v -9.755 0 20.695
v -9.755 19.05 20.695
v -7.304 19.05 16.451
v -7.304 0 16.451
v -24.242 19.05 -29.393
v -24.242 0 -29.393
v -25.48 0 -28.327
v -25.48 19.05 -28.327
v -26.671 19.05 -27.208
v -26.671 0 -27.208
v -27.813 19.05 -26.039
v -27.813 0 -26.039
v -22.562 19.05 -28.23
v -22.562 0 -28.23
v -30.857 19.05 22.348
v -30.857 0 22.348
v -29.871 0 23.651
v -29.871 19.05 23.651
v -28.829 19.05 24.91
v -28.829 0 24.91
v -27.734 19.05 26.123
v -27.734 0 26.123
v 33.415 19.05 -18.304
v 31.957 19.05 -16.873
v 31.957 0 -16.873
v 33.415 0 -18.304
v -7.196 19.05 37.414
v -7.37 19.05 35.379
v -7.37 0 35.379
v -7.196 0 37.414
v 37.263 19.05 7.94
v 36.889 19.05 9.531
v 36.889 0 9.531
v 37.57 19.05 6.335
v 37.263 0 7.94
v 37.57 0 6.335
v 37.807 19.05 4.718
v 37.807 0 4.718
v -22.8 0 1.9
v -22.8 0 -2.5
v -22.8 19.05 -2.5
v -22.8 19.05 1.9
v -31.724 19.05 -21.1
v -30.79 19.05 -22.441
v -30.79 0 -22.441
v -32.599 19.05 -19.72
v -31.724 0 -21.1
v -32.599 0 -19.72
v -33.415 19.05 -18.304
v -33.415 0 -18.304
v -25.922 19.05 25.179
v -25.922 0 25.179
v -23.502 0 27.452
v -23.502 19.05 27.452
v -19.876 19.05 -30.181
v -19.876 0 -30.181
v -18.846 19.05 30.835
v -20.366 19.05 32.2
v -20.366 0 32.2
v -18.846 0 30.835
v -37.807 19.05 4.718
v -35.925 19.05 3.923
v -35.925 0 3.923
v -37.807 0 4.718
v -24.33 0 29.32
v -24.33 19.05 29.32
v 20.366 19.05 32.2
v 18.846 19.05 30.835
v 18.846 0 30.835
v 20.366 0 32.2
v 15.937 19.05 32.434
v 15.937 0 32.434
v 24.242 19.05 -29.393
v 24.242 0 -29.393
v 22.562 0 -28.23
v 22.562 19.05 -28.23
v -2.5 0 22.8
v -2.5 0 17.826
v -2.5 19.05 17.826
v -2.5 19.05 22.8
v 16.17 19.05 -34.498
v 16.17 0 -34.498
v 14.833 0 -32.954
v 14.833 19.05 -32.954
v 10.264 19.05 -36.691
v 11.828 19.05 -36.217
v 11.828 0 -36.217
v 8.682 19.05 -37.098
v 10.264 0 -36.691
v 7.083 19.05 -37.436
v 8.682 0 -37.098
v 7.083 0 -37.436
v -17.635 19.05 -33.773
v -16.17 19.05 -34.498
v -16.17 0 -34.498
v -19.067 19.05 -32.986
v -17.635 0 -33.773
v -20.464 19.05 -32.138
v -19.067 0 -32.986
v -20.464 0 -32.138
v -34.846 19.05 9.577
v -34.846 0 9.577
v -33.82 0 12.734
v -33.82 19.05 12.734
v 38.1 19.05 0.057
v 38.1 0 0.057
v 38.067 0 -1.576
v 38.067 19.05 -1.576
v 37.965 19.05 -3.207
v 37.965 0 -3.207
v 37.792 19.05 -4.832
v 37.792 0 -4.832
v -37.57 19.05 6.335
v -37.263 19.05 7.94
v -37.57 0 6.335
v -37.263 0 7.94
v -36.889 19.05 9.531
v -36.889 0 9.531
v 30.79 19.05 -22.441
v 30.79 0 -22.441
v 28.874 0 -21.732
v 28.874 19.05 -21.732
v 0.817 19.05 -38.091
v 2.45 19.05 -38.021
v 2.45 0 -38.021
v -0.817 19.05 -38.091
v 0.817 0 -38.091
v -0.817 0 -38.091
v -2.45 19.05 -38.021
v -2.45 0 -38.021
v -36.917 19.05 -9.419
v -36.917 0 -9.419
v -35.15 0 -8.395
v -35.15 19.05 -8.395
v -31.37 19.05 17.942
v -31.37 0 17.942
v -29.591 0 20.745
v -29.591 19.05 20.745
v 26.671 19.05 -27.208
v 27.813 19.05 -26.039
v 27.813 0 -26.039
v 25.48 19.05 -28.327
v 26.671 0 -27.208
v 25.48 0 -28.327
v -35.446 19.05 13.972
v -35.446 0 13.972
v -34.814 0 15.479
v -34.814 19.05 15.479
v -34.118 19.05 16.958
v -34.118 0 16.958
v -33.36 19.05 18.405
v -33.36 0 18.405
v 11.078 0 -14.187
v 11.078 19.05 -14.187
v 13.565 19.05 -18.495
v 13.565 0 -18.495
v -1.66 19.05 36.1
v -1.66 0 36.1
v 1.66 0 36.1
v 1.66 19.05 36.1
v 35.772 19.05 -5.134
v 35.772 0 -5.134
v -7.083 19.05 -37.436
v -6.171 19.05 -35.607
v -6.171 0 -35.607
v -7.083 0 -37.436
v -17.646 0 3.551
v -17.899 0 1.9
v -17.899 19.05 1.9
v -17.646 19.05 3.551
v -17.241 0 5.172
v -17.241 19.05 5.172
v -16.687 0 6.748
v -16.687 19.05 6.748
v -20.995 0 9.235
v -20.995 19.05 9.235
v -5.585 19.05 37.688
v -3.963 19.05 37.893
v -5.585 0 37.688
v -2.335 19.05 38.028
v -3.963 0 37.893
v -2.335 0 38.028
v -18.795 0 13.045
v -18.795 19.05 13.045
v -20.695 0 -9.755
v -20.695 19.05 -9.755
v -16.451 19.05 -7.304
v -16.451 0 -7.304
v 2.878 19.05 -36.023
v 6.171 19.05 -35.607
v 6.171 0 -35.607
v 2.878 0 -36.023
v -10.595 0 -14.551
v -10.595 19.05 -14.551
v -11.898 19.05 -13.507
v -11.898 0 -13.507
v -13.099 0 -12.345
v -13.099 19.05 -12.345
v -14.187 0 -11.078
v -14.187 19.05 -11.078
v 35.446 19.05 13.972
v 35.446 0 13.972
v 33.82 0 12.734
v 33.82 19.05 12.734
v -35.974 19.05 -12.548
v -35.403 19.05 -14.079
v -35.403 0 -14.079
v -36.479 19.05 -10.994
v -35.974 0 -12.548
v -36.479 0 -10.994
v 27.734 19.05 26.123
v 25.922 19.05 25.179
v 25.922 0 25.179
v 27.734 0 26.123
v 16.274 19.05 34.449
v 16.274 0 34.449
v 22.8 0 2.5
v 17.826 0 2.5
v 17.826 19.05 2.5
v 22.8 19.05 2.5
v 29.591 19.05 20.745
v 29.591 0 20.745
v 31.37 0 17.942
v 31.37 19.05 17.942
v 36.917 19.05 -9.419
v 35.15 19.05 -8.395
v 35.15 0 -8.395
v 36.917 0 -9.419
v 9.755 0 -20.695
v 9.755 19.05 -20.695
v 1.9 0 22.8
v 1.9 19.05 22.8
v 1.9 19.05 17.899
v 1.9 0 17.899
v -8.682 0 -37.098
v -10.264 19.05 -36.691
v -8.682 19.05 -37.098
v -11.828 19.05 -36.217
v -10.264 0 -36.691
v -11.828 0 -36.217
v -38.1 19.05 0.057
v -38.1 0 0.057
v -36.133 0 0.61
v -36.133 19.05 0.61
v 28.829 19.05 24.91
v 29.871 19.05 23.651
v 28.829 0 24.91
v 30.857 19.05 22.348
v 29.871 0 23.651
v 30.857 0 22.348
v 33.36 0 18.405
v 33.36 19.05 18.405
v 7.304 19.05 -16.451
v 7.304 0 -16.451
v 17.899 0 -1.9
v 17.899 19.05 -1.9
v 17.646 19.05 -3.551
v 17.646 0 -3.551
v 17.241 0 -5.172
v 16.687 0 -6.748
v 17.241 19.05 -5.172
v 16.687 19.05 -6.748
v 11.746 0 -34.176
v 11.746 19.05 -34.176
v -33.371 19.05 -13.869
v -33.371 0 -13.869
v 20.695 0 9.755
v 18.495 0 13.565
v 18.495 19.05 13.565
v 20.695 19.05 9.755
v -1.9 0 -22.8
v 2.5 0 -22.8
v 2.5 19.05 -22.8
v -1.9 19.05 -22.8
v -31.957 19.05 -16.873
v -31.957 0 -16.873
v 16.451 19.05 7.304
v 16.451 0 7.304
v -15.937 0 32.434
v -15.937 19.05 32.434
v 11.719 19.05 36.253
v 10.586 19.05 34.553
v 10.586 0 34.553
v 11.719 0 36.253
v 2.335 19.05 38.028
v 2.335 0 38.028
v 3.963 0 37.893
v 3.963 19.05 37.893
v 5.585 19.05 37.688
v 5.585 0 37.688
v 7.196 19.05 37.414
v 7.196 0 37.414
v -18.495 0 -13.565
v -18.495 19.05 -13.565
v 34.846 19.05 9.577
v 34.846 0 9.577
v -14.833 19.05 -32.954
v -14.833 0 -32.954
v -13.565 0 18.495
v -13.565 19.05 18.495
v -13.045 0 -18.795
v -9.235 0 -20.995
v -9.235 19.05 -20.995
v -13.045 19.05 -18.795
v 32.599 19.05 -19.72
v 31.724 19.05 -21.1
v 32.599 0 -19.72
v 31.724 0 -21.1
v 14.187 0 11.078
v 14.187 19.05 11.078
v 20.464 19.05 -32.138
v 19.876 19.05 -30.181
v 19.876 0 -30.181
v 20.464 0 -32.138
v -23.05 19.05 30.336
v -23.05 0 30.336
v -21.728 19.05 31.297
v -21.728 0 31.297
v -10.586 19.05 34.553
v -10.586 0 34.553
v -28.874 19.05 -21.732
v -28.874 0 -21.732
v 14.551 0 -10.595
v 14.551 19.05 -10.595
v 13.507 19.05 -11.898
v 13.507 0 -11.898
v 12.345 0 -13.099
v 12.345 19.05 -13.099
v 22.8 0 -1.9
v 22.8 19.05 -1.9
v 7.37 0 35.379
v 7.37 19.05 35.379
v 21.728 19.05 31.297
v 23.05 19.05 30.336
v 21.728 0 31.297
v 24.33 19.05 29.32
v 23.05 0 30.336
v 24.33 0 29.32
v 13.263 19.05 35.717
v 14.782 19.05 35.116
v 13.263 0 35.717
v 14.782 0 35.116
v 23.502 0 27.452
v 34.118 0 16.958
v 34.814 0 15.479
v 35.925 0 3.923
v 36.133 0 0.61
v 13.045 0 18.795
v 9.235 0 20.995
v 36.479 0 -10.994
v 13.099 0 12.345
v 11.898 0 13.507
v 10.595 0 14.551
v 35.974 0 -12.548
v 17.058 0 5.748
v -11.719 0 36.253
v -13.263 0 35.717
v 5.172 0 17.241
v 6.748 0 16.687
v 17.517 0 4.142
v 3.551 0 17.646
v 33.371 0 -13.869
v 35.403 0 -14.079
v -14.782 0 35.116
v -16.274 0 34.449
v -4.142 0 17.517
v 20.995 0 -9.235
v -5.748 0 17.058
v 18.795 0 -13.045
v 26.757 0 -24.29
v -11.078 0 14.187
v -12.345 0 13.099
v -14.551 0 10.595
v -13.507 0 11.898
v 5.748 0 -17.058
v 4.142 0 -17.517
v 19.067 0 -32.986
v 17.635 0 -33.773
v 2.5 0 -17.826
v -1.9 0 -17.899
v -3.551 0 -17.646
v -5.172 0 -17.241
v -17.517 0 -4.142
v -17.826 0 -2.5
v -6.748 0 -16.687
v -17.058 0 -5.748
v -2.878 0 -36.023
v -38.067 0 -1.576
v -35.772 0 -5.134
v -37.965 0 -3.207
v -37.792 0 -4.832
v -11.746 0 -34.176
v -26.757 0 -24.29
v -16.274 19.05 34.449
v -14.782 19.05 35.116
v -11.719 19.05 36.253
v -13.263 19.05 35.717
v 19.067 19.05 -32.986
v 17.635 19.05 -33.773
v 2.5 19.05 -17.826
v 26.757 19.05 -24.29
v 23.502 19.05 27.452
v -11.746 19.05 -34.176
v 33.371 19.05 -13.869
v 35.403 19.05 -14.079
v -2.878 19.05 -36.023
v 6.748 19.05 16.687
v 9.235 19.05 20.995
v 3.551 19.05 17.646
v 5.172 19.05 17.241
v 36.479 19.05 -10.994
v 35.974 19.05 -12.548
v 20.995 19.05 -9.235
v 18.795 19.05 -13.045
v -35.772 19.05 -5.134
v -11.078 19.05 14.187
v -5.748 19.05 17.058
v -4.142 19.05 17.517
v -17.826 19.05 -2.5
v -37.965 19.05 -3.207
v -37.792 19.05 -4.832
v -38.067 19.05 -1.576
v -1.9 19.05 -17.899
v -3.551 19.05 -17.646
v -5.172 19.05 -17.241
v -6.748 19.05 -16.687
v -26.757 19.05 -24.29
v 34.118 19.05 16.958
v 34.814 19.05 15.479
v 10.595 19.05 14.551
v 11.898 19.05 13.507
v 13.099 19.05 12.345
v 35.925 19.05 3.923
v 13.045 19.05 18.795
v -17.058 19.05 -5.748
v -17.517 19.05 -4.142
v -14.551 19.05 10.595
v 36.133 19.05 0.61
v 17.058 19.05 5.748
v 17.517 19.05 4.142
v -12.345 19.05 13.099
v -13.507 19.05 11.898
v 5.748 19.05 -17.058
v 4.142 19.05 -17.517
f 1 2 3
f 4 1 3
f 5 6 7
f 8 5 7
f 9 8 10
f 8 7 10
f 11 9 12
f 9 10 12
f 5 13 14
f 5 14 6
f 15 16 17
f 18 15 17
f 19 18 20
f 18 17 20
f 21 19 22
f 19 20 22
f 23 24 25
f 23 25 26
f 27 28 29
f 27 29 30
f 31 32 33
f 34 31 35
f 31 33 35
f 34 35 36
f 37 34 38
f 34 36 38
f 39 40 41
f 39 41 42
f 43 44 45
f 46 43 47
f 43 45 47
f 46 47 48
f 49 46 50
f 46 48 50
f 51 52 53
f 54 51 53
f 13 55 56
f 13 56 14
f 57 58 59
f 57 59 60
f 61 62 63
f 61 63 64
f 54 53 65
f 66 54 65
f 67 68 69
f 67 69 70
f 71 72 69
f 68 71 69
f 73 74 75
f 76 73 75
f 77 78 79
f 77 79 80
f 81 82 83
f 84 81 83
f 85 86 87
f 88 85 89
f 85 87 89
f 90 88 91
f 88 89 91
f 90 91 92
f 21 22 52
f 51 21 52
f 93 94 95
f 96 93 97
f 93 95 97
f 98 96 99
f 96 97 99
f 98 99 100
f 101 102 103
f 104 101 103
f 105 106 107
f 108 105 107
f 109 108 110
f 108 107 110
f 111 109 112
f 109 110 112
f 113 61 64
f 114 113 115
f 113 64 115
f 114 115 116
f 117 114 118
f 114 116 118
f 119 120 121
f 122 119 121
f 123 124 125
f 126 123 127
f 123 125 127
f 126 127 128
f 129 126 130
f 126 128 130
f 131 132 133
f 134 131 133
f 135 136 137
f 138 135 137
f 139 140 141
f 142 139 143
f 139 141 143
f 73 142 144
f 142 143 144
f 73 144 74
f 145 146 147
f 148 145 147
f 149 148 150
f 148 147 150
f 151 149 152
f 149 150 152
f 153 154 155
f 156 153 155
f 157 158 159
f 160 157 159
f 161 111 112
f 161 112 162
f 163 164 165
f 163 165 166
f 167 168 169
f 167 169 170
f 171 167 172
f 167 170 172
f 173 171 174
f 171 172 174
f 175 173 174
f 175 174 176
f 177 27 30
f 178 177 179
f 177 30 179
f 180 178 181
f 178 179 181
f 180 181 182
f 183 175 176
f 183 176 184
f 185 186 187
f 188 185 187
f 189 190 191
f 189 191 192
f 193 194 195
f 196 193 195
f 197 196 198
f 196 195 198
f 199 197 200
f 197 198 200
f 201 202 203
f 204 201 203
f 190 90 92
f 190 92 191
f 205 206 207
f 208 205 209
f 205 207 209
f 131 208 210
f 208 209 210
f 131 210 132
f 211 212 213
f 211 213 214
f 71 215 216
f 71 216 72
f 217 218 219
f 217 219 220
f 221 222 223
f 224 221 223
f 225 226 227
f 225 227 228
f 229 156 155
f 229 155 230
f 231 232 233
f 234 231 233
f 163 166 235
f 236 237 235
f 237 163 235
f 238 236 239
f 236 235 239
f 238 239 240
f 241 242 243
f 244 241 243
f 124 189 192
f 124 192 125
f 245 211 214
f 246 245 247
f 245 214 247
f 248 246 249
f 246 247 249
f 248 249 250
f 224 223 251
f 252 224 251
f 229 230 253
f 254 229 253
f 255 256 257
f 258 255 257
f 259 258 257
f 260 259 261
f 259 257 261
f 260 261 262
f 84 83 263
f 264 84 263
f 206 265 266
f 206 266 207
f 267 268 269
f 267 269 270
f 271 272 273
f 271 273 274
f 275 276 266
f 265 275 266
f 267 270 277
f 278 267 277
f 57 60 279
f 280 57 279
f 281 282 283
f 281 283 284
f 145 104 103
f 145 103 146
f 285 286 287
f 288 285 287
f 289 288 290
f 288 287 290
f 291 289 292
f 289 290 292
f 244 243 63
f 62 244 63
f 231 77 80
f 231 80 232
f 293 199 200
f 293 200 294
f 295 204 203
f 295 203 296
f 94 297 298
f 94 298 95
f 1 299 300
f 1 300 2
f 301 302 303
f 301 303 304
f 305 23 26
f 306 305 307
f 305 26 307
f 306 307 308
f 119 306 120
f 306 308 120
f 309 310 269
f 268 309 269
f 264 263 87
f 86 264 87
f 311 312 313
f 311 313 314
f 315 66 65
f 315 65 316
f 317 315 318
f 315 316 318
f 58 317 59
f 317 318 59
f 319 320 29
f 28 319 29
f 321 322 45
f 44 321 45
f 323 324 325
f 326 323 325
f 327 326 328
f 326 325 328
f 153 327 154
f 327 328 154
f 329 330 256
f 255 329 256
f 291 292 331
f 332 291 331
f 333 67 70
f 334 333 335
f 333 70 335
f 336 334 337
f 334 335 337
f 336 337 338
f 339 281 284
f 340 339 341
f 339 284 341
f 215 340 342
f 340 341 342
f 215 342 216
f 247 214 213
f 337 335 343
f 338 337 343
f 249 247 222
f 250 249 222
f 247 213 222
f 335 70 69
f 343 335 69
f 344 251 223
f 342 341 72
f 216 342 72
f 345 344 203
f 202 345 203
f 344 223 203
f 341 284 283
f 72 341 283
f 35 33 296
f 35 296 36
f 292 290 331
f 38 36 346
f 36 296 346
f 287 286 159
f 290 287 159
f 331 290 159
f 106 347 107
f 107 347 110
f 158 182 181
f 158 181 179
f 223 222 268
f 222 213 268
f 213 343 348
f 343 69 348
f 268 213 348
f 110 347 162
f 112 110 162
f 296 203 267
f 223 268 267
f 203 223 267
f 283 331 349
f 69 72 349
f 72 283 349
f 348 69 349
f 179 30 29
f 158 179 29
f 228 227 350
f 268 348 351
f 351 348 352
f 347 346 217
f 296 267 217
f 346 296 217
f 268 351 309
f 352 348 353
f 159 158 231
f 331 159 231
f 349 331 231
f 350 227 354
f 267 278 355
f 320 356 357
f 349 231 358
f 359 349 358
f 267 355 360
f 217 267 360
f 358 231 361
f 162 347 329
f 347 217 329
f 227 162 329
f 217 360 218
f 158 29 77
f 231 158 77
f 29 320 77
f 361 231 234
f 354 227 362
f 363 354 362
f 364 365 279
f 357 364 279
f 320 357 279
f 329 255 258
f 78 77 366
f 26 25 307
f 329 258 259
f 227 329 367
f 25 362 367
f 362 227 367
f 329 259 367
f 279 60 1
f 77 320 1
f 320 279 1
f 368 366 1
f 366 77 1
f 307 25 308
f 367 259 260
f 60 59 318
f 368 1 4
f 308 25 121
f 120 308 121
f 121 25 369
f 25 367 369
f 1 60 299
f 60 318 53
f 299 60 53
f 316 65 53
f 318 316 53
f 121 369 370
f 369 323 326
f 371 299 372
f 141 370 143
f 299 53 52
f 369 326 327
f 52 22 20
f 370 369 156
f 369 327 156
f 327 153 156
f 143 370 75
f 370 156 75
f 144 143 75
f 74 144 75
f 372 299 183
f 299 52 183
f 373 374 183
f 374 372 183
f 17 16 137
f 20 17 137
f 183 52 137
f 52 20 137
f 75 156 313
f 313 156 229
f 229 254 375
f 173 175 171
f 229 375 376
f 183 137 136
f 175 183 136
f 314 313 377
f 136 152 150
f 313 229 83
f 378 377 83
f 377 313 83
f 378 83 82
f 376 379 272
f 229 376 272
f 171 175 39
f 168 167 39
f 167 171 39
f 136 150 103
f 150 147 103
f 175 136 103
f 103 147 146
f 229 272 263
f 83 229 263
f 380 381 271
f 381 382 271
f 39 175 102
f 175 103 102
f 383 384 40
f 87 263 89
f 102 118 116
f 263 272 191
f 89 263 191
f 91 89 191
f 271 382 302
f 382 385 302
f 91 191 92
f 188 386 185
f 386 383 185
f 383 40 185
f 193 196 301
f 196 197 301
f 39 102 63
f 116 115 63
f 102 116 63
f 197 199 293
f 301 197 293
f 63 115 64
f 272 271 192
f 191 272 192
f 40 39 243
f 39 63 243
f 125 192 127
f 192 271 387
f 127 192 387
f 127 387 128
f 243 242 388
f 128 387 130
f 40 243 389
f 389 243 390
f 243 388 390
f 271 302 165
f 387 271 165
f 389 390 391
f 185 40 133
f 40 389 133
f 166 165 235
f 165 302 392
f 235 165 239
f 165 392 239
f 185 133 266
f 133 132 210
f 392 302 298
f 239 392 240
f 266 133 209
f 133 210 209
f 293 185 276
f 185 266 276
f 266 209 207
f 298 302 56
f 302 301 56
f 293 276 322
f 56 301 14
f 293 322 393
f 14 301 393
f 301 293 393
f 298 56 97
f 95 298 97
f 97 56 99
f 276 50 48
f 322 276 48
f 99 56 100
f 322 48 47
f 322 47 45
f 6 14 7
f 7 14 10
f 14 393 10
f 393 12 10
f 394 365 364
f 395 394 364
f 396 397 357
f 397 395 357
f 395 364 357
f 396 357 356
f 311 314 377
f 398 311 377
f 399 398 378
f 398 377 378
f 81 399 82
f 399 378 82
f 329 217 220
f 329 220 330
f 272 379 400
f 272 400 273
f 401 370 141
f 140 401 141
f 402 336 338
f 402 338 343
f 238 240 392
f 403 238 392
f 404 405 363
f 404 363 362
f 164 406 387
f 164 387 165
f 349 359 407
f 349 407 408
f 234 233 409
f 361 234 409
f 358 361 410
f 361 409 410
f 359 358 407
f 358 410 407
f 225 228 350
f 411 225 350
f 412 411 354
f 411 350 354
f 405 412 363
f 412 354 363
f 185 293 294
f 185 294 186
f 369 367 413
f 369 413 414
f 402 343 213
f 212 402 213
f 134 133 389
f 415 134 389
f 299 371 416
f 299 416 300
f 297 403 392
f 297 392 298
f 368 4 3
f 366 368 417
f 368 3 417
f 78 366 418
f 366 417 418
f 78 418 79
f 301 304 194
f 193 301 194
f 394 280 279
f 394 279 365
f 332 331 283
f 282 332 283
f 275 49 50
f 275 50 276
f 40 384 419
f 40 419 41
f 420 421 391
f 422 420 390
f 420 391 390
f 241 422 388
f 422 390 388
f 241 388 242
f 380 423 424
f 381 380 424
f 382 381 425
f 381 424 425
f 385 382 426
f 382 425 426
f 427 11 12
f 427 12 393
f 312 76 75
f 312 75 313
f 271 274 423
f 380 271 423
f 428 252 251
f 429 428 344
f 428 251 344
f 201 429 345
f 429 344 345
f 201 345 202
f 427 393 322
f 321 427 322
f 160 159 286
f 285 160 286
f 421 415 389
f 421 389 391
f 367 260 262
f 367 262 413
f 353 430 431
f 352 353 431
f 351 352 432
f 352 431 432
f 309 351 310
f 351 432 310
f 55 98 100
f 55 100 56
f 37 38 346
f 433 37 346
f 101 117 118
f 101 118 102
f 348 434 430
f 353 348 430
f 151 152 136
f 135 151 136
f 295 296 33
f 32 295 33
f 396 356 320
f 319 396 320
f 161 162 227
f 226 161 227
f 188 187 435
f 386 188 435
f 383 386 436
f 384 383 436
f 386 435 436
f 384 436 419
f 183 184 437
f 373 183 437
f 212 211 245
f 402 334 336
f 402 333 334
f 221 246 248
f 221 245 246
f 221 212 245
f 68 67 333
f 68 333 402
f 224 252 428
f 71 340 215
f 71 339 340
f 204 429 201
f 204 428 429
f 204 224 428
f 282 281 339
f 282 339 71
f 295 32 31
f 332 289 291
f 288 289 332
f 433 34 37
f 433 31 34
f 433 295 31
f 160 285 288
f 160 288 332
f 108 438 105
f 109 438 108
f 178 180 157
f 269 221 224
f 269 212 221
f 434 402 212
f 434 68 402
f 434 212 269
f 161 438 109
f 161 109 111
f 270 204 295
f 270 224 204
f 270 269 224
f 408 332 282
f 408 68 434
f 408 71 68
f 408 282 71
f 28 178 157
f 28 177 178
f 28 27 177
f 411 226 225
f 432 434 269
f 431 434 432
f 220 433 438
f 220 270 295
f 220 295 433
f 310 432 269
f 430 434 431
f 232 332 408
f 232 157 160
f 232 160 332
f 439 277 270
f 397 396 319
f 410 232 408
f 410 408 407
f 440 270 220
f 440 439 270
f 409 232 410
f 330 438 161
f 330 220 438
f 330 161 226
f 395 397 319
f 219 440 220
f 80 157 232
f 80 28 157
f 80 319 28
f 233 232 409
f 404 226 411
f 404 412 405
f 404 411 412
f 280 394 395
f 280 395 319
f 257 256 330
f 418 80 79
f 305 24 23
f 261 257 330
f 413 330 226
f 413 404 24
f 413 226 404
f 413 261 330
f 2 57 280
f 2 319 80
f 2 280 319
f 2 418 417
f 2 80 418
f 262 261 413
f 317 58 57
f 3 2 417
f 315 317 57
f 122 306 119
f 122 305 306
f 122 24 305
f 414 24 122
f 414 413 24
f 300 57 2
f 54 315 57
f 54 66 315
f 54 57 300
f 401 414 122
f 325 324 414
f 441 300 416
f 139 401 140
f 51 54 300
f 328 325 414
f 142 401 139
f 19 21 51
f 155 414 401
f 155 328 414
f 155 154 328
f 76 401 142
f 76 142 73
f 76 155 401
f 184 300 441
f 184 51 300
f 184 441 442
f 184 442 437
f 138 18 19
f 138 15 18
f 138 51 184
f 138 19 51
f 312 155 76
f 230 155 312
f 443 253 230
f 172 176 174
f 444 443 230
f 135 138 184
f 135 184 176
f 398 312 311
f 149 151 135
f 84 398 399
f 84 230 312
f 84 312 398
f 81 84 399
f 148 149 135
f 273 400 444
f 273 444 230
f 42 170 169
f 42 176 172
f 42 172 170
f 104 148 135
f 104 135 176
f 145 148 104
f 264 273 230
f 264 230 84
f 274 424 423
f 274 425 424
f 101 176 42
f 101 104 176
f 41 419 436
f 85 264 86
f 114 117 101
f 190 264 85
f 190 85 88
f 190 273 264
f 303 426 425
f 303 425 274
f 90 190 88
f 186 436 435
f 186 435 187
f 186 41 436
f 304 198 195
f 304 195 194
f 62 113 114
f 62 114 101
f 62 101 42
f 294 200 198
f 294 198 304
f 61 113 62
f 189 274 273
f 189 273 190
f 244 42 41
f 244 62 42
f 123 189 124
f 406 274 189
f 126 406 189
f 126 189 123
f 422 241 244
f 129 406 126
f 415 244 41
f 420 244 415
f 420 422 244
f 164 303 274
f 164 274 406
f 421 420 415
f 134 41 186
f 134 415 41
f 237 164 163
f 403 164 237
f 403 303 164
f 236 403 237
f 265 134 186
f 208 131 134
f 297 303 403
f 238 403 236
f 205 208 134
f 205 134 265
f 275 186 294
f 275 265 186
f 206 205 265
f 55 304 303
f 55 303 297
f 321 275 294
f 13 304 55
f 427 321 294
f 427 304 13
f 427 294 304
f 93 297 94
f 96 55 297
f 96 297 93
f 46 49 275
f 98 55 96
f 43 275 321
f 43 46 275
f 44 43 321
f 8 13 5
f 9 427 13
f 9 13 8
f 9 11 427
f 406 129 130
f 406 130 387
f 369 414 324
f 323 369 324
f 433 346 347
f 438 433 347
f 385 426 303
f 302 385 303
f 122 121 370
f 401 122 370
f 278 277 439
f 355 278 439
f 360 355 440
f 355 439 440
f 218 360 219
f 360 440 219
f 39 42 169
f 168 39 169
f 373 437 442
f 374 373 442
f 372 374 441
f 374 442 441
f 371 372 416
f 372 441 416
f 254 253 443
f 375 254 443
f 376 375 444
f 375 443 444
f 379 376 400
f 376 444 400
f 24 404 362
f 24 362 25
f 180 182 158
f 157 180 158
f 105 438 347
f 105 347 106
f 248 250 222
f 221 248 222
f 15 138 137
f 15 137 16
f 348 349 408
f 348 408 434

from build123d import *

# Parameters (mm, degrees)
SKETCH1_R           = 38.1
BOSS_EXTRUDE1_DEPTH = 19.05
CUT_EXTRUDE1_DEPTH  = 33
CIRPATTERN1_COUNT   = 25
CUT_EXTRUDE2_DEPTH  = 28
CUT_EXTRUDE8_DEPTH  = 23
CIRPATTERN2_COUNT   = 12


with BuildPart() as part:
    # Sketch1 → Boss-Extrude1 (new body)
    with BuildSketch(Plane(origin=(0, 0, 0), x_dir=(1, 0, 0), z_dir=(0, 1, 0))):
        Circle(SKETCH1_R)
    extrude(amount=BOSS_EXTRUDE1_DEPTH)

    # Sketch2 → Cut-Extrude1 (cut)
    with BuildSketch(Plane.XZ):
        Polygon((0, 38.1), (-2.36, 38.1), (-1.66, 36.1), (0, 36.1), (1.66, 36.1), (2.36, 38.1), align=None)
    cut_extrude1 = extrude(amount=-CUT_EXTRUDE1_DEPTH, mode=Mode.SUBTRACT)

    # CirPattern1: Cut-Extrude1 ×25 about axis
    cirpattern1_axis = Axis((0, 0, 0), (0, 1, 0))
    for i in range(1, CIRPATTERN1_COUNT):
        add(cut_extrude1.rotate(cirpattern1_axis, i * 360 / CIRPATTERN1_COUNT), mode=Mode.SUBTRACT)

    # Sketch3 → Cut-Extrude2 (cut)
    with BuildSketch(Plane(origin=(0, 19.05, 0), x_dir=(1, 0, 0), z_dir=(0, 1, 0))):
        with BuildLine():
            ThreePointArc((2.5, 17.82554347), (0.302266808, 17.997461898), (-1.9, 17.899441332))
            ThreePointArc((-1.9, 17.899441332), (-12.037441589, -13.382824814), (18, 0))
            ThreePointArc((18, 0), (13.583077707, 11.811011811), (2.5, 17.82554347))
        make_face()
    extrude(amount=-CUT_EXTRUDE2_DEPTH, mode=Mode.SUBTRACT)

    # Sketch3<7> → Cut-Extrude8 (cut)
    with BuildSketch(Plane(origin=(0, 19.05, 0), x_dir=(1, 0, 0), z_dir=(0, 1, 0))):
        with BuildLine():
            Line((0.3, 22.8), (-1.9, 22.8))
            Line((-1.9, 22.8), (-1.9, 17.899441332))
            ThreePointArc((-1.9, 17.899441332), (0.302266808, 17.997461898), (2.5, 17.82554347))
            Line((2.5, 17.82554347), (2.5, 22.8))
            Line((2.5, 22.8), (0.3, 22.8))
        make_face()
    cut_extrude8 = extrude(amount=-CUT_EXTRUDE8_DEPTH, mode=Mode.SUBTRACT)

    # CirPattern2: Cut-Extrude8 ×12 about axis
    cirpattern2_axis = Axis((0, 19.05, 0), (0, 1, 0))
    for i in range(1, CIRPATTERN2_COUNT):
        add(cut_extrude8.rotate(cirpattern2_axis, i * 360 / CIRPATTERN2_COUNT), mode=Mode.SUBTRACT)


solid = part.part
